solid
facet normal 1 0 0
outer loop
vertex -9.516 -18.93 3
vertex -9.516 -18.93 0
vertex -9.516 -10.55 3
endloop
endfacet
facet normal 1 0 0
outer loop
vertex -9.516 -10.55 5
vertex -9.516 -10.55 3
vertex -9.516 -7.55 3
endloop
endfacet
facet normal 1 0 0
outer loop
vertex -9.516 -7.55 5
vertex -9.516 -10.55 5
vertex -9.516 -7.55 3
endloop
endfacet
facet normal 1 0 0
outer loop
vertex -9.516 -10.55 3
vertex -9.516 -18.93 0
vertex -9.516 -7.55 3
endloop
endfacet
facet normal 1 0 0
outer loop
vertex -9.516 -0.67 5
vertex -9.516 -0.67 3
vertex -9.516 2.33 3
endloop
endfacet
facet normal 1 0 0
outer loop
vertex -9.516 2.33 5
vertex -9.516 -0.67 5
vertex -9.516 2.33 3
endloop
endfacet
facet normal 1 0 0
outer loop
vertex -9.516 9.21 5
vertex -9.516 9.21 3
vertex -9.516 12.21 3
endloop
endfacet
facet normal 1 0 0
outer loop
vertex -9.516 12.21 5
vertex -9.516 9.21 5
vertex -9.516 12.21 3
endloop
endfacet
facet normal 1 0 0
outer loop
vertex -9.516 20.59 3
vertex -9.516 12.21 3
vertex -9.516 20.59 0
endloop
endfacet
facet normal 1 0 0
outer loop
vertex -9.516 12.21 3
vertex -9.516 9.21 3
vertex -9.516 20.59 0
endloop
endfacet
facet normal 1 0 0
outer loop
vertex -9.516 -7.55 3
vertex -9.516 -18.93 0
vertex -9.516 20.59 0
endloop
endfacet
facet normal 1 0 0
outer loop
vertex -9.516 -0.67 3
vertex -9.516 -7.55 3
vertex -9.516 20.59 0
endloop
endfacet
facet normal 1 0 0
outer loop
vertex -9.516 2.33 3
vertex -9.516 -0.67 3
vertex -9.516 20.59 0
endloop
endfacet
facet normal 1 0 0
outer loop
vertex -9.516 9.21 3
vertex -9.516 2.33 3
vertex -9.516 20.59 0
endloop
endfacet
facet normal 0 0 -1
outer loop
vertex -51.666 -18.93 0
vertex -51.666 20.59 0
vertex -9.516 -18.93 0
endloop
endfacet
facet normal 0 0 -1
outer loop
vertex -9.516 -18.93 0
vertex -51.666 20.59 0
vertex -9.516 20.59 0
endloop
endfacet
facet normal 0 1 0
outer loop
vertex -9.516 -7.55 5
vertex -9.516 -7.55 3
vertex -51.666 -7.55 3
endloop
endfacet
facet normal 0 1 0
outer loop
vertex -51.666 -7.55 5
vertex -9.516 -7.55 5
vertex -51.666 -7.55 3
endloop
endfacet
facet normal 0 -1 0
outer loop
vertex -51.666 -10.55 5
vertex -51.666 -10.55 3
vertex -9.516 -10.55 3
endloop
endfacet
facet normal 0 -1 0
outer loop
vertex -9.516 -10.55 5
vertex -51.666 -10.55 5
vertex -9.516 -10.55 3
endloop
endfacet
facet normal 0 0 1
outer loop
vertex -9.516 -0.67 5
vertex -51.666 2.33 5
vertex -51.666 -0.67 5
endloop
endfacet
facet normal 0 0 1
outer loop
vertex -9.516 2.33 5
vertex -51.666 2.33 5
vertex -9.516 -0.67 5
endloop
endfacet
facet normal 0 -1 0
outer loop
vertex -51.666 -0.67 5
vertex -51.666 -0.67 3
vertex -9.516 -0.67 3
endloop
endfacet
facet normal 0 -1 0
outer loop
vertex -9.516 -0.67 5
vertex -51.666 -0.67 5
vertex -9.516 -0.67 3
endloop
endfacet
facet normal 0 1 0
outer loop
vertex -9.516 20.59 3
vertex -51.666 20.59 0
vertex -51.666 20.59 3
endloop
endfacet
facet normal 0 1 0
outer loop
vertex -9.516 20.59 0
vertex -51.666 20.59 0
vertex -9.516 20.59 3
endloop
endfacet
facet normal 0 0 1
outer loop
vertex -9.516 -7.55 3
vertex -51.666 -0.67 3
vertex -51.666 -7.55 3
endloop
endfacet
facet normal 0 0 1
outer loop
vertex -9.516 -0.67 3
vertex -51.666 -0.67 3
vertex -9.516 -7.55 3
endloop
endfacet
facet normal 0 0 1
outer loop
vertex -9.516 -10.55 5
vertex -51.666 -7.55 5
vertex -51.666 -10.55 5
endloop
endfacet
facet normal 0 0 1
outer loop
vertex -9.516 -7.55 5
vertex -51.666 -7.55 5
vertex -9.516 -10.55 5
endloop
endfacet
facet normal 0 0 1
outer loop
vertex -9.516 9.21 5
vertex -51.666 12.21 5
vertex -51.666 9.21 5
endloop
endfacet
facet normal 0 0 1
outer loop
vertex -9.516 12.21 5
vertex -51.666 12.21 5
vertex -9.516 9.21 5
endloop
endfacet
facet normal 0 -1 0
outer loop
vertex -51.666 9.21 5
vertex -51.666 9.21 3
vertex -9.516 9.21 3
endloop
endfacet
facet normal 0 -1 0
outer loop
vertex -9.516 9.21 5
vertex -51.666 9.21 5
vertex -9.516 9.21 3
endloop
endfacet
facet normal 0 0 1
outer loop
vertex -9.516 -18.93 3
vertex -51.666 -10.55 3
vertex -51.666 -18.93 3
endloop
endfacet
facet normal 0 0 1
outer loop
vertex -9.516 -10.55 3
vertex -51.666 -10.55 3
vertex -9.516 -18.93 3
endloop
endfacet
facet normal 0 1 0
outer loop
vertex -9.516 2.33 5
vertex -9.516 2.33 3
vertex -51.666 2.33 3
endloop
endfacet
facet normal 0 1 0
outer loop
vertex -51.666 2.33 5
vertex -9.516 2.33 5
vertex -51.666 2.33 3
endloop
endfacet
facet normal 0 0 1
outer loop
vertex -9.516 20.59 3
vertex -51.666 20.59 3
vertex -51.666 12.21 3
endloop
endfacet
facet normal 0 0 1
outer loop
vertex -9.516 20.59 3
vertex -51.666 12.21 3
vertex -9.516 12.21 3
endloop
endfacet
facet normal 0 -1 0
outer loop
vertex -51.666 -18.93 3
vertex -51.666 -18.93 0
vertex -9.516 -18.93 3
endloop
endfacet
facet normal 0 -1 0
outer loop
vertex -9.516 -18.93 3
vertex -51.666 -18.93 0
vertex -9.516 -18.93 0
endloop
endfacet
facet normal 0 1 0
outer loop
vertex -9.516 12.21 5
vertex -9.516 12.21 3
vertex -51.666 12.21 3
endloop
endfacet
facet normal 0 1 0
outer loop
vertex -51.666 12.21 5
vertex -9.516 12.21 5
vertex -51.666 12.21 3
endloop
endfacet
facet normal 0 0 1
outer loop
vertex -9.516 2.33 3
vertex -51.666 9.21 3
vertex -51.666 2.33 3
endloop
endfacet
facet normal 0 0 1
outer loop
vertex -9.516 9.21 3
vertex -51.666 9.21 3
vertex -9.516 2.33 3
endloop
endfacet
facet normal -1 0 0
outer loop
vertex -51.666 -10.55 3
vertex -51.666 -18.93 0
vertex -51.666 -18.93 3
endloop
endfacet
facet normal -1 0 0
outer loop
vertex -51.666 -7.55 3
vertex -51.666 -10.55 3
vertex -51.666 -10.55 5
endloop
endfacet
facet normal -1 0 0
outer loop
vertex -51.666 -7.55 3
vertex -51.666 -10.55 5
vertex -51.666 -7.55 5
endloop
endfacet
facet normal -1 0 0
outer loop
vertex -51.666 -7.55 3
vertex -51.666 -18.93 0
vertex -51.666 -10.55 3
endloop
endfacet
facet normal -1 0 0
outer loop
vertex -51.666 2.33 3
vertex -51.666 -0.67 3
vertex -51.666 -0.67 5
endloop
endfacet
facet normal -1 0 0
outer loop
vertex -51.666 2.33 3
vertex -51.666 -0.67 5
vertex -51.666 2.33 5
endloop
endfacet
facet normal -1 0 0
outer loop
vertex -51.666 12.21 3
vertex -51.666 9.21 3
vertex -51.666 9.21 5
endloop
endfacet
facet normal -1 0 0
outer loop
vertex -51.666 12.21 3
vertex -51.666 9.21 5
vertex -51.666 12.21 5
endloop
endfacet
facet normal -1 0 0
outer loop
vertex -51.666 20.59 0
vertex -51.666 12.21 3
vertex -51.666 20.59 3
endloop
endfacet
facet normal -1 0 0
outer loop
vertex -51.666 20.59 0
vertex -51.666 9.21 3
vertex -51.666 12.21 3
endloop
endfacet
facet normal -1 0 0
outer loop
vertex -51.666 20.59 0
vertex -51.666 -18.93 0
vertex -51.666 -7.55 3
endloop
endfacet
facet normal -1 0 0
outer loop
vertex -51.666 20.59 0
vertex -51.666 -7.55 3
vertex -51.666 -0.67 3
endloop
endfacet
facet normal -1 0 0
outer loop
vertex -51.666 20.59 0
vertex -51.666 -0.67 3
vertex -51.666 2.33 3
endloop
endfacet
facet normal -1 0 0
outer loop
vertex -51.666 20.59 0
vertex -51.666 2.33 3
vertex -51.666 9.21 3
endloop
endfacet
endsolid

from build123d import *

# Parameters (mm, degrees)
SKETCH2_W           = 42.15
SKETCH2_H           = 39.52
BOSS_EXTRUDE1_DEPTH = 3
BOSS_EXTRUDE2_DEPTH = 2


with BuildPart() as part:
    # Sketch2 → Boss-Extrude1 (new body)
    with BuildSketch(Plane.XY):
        with Locations((-30.591454667, 0.829849509)):
            Rectangle(SKETCH2_W, SKETCH2_H)
    extrude(amount=BOSS_EXTRUDE1_DEPTH)

    # Sketch3 → Boss-Extrude2 (add)
    with BuildSketch(Plane.XY.offset(3)):
        Polygon((-51.666454667, 9.209849509), (-9.516454667, 9.209849509), (-9.516454667, 12.209849509), (-51.666454667, 12.209849509), (-51.666454667, 10.709849509), align=None)
        Polygon((-51.666454667, 0.829849509), (-51.666454667, -0.670150491), (-9.516454667, -0.670150491), (-9.516454667, 2.329849509), (-51.666454667, 2.329849509), align=None)
        Polygon((-51.666454667, -7.550150491), (-51.666454667, -9.050150491), (-51.666454667, -10.550150491), (-9.516454667, -10.550150491), (-9.516454667, -7.550150491), align=None)
    extrude(amount=BOSS_EXTRUDE2_DEPTH)


solid = part.part
